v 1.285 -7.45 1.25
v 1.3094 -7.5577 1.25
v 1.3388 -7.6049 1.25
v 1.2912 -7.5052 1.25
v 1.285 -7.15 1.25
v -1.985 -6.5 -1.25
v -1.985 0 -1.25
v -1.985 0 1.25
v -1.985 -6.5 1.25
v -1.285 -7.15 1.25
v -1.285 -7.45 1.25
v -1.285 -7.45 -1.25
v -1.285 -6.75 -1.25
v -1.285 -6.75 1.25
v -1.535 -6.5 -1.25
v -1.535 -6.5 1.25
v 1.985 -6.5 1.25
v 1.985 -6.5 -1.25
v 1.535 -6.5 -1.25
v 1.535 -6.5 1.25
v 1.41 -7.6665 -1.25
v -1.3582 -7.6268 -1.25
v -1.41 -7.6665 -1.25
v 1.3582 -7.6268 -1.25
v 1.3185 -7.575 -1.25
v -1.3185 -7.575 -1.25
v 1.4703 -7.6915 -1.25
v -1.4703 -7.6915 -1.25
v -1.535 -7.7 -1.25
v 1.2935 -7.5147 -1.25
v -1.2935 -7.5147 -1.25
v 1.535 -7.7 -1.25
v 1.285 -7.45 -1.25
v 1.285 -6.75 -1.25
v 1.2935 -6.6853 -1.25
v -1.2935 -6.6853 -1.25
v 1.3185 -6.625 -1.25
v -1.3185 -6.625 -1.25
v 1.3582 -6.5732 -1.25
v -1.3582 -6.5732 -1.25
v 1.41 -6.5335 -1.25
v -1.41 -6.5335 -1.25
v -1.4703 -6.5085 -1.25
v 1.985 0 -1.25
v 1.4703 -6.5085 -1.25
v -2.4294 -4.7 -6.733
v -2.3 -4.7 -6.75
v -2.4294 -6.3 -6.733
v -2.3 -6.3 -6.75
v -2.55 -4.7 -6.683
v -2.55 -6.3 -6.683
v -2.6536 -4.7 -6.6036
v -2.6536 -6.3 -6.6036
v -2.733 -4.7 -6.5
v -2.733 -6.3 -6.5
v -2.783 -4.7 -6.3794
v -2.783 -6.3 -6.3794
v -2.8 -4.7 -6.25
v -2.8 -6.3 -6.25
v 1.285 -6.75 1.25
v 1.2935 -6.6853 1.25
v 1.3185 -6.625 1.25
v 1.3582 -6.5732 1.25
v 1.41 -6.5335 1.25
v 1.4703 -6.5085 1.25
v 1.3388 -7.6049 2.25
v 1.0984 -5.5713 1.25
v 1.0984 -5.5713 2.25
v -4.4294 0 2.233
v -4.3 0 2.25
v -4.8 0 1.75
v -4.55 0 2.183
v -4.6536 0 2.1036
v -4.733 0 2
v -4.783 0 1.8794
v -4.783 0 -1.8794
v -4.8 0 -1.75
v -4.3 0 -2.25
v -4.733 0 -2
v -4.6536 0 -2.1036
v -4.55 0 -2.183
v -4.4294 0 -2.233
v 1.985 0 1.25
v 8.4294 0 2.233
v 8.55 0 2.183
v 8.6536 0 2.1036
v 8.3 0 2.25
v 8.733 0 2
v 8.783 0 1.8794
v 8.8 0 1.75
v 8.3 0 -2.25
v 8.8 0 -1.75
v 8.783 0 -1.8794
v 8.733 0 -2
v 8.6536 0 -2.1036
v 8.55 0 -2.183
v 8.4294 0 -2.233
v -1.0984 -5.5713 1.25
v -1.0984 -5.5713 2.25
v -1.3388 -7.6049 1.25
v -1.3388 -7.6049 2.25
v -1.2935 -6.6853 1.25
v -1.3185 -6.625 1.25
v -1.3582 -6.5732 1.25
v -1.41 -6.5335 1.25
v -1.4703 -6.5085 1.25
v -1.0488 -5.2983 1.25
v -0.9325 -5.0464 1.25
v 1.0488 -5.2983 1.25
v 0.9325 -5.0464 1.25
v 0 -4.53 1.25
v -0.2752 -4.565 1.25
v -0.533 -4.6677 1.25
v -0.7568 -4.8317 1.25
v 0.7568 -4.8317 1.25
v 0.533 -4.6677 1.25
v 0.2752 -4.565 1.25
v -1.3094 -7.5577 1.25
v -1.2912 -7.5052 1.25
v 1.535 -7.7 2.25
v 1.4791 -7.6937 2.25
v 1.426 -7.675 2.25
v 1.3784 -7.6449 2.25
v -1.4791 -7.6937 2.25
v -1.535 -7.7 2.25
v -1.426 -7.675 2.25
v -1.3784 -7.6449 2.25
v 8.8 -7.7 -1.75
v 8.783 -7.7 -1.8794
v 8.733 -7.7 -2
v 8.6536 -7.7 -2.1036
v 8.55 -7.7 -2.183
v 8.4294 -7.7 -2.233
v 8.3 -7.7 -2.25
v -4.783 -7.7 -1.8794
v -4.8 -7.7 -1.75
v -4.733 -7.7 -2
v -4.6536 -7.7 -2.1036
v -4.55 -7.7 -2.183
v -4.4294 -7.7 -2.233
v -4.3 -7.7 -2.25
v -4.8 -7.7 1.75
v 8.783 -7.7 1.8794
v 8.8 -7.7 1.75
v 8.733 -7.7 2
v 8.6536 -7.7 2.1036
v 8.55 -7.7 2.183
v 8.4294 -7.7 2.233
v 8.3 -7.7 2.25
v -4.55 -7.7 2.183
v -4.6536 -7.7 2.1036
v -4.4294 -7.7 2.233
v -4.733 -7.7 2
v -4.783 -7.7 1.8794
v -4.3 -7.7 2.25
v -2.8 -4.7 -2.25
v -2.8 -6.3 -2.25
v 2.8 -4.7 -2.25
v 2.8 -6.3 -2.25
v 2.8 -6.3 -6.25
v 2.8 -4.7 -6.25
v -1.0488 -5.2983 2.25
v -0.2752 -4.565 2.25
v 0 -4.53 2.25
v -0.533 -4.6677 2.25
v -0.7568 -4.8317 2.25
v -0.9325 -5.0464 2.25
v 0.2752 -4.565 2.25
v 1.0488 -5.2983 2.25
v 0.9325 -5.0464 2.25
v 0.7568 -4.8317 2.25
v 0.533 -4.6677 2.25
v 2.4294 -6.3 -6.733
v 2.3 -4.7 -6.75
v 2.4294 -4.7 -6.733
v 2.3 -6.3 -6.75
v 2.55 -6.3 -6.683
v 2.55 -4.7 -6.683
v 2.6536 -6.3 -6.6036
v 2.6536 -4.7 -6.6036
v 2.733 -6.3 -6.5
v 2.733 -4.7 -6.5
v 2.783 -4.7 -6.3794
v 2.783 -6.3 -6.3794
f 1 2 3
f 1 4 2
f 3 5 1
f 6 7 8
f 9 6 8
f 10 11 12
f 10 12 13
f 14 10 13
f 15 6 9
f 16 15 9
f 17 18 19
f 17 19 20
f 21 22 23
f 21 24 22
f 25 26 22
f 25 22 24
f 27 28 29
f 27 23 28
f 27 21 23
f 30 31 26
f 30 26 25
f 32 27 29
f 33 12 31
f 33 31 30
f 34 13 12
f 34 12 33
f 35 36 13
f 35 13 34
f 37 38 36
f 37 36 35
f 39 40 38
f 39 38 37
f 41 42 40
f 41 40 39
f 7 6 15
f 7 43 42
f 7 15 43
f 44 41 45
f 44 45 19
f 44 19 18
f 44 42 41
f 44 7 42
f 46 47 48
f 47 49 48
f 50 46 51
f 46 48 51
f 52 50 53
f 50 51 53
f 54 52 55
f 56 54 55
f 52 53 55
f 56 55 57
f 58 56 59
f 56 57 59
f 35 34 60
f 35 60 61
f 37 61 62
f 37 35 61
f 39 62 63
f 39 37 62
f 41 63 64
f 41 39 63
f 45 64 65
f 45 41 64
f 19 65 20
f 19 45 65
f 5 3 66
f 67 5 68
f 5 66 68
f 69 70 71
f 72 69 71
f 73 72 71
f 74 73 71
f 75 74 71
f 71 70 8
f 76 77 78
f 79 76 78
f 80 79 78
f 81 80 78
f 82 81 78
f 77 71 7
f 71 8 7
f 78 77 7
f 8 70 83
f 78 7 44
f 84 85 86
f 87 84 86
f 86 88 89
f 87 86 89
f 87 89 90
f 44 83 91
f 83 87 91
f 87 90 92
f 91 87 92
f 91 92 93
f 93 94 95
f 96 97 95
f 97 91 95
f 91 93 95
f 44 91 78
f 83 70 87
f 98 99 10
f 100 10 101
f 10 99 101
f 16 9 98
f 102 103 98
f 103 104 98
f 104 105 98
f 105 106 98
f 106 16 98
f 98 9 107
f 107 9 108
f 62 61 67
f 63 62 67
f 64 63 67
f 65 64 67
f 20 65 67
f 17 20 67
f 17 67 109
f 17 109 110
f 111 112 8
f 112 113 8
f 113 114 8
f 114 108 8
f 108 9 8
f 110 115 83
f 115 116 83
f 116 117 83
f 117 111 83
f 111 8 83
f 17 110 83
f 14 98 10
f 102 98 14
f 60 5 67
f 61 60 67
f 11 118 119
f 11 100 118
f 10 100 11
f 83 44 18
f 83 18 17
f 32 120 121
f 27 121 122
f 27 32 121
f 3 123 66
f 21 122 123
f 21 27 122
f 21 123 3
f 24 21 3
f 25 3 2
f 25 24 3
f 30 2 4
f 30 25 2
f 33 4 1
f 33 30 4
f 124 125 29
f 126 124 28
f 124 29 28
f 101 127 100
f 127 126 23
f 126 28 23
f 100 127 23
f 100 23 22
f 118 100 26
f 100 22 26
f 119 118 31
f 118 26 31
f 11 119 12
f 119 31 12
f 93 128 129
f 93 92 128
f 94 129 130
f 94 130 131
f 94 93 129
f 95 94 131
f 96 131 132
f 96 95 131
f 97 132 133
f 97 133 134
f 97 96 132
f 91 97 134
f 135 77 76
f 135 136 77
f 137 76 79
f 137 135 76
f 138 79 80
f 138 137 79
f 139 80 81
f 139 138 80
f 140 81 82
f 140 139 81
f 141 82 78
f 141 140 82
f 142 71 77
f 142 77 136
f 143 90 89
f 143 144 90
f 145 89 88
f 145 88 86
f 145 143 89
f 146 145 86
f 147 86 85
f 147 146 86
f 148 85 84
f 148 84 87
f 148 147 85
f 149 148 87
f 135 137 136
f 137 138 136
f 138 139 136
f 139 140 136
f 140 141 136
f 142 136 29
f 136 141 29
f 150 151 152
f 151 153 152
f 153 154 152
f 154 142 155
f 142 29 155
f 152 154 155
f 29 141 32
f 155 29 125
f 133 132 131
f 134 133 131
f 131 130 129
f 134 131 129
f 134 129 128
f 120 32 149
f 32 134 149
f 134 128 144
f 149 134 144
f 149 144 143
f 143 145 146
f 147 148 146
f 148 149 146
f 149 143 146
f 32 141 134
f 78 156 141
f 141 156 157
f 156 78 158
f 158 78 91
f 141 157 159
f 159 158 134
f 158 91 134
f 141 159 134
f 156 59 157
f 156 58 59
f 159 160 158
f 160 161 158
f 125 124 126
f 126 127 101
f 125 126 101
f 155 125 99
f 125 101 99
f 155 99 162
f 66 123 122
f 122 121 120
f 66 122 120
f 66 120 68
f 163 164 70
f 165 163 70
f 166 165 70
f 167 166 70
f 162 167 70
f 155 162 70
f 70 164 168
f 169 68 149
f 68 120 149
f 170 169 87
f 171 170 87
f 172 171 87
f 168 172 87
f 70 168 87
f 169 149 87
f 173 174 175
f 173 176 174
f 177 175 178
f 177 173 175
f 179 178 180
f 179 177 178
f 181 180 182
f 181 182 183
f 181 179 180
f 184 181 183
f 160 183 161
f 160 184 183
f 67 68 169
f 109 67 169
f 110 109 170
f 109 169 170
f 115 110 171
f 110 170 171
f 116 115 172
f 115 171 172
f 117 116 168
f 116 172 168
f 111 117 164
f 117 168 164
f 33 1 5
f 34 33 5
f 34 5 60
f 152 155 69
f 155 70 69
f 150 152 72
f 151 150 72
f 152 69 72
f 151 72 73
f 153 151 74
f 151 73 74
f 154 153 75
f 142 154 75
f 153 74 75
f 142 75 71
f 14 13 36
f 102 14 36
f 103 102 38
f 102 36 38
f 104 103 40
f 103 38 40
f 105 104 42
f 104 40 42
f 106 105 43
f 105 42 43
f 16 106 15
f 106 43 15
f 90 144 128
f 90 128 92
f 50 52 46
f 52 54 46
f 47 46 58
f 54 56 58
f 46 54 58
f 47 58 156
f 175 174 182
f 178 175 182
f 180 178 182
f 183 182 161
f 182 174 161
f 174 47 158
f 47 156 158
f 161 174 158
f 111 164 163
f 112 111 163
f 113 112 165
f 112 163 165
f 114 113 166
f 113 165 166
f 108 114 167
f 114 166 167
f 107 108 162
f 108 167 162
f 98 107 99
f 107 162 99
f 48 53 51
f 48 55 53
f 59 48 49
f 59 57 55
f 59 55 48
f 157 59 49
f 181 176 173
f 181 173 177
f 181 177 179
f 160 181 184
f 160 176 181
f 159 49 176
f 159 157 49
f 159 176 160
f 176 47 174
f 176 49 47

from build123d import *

# Parameters (mm, degrees)
F0_W         = 5.6
F0_H         = 4.5
F0_W_2       = 3.97
F0_H_2       = 2.5
F1_DEPTH     = 7.7
F2_W         = 5.6
F2_H         = 1.6
F3_DEPTH     = 4.5
F4_W         = 1.2
F4_H         = 2.5
F5_DEPTH     = 0.7
F8_DEPTH     = 6
F10_DEPTH    = 1
F12_DEPTH    = 2
F13_R        = 0.5
F14_T1_DEPTH = 4
F14_T3_DEPTH = 2.5


# Not quite as in the source:
# - a fillet or chamfer that OpenCascade refuses, or shapes differently, is made with other operations: its cross-section is extruded or revolved along the edge and cut away or added
# - a pattern or mirror of a feature is missing from the dataset's text; its kind, count and spacing are read off the source's solid


with BuildPart() as f1:
    # F0 (on Front) → F1 (new body)
    with BuildSketch(Plane.XZ):
        Rectangle(F0_W, F0_H)
        Rectangle(F0_W_2, F0_H_2, mode=Mode.SUBTRACT)
    extrude(amount=F1_DEPTH)

    # F2 (on face) → F3 (join)
    with BuildSketch(Plane(origin=(0, 0, -2.25), x_dir=(1, 0, 0), z_dir=(0, 0, -1))):
        with Locations((0, 5.5)):
            Rectangle(F2_W, F2_H)
    extrude(amount=F3_DEPTH)

    # F4 (on face) → F5 (join)
    with BuildSketch(Plane.YZ.offset(-1.985)):
        with Locations((-7.1, 0)):
            Rectangle(F4_W, F4_H)
    f5 = extrude(amount=F5_DEPTH)

    # F5_copies: F5 across plane
    add(f5.mirror(Plane(origin=(0, 0, 0), x_dir=(0, 0, 1), z_dir=(1, 0, 0))))

    # F7 (on face) → F8 (join)
    with BuildSketch(Plane.YZ.offset(2.8)):
        Polygon((0, 2.25), (-7.7, 2.25), (-7.7, -2.25), (-6.3, -2.25), (-4.7, -2.25), (0, -2.25), align=None)
    extrude(amount=F8_DEPTH)

    # F9 (on face) → F10 (cut)
    with BuildSketch(Plane.XY.offset(2.25)):
        with BuildLine():
            ThreePointArc((-1.0984344714, -5.5712931935), (-0.0293434956, -6.7295678482), (1.1, -5.6299593))
            ThreePointArc((1.1, -5.6299593), (1.0996085482, -5.6006158044), (1.0984344714, -5.5712931935))
            ThreePointArc((1.0984344714, -5.5712931935), (0.7567916764, -4.8316696542), (0, -4.5299593))
            ThreePointArc((0, -4.5299593), (-0.7567916764, -4.8316696542), (-1.0984344714, -5.5712931935))
        make_face()
        with BuildLine():
            ThreePointArc((1.0984344714, -5.5712931935), (1.0996085482, -5.6006158044), (1.1, -5.6299593))
            ThreePointArc((1.1, -5.6299593), (-0.0293434956, -6.7295678482), (-1.0984344714, -5.5712931935))
            Line((-1.0984344714, -5.5712931935), (-1.35, -7.7))
            Line((-1.35, -7.7), (1.35, -7.7))
            Line((1.35, -7.7), (1.0984344714, -5.5712931935))
        make_face()
    extrude(amount=-F10_DEPTH, mode=Mode.SUBTRACT)

    # F11 (on face) → F12 (join)
    with BuildSketch(Plane(origin=(-2.8, 0, 0), x_dir=(0, -1, 0), z_dir=(-1, 0, 0))):
        Polygon((7.7, -2.25), (7.7, 2.25), (0, 2.25), (0, -2.25), (4.7, -2.25), (6.3, -2.25), align=None)
    extrude(amount=F12_DEPTH)

    # F13
    f13_edges = [f1.edges().sort_by_distance(p)[0] for p in [
        (8.8, -3.85, -2.25),
        (8.8, -3.85, 2.25),
        (2.8, -5.5, -6.75),
        (-4.8, -3.85, 2.25),
        (-4.8, -3.85, -2.25),
        (-2.8, -5.5, -6.75),
    ]]
    fillet(f13_edges, radius=F13_R)

    # F14: fillet of radius 0.25 on 4 edges, made by hand

    # F14_s2 → F14_t1 (cut)
    with BuildSketch(Plane.XY.offset(-1.25)):
        with BuildLine():
            ThreePointArc((-1.535, -7.7), (-1.3582233047, -7.6267766953), (-1.285, -7.45))
            Line((-1.285, -7.45), (-1.28, -7.45))
            Line((-1.28, -7.45), (-1.28, -7.705))
            Line((-1.28, -7.705), (-1.535, -7.705))
            Line((-1.535, -7.705), (-1.535, -7.7))
        make_face()
        with BuildLine():
            ThreePointArc((1.535, -7.7), (1.3582233047, -7.6267766953), (1.285, -7.45))
            Line((1.285, -7.45), (1.28, -7.45))
            Line((1.28, -7.45), (1.28, -7.705))
            Line((1.28, -7.705), (1.535, -7.705))
            Line((1.535, -7.705), (1.535, -7.7))
        make_face()
    extrude(amount=F14_T1_DEPTH, mode=Mode.SUBTRACT)

    # F14_s4 → F14_t3 (cut)
    with BuildSketch(Plane.XY.offset(-1.25)):
        with BuildLine():
            ThreePointArc((-1.285, -6.75), (-1.3582233047, -6.5732233047), (-1.535, -6.5))
            Line((-1.535, -6.5), (-1.535, -6.495))
            Line((-1.535, -6.495), (-1.28, -6.495))
            Line((-1.28, -6.495), (-1.28, -6.75))
            Line((-1.28, -6.75), (-1.285, -6.75))
        make_face()
        with BuildLine():
            ThreePointArc((1.285, -6.75), (1.3582233047, -6.5732233047), (1.535, -6.5))
            Line((1.535, -6.5), (1.535, -6.495))
            Line((1.535, -6.495), (1.28, -6.495))
            Line((1.28, -6.495), (1.28, -6.75))
            Line((1.28, -6.75), (1.285, -6.75))
        make_face()
    extrude(amount=F14_T3_DEPTH, mode=Mode.SUBTRACT)


solid = f1.part
